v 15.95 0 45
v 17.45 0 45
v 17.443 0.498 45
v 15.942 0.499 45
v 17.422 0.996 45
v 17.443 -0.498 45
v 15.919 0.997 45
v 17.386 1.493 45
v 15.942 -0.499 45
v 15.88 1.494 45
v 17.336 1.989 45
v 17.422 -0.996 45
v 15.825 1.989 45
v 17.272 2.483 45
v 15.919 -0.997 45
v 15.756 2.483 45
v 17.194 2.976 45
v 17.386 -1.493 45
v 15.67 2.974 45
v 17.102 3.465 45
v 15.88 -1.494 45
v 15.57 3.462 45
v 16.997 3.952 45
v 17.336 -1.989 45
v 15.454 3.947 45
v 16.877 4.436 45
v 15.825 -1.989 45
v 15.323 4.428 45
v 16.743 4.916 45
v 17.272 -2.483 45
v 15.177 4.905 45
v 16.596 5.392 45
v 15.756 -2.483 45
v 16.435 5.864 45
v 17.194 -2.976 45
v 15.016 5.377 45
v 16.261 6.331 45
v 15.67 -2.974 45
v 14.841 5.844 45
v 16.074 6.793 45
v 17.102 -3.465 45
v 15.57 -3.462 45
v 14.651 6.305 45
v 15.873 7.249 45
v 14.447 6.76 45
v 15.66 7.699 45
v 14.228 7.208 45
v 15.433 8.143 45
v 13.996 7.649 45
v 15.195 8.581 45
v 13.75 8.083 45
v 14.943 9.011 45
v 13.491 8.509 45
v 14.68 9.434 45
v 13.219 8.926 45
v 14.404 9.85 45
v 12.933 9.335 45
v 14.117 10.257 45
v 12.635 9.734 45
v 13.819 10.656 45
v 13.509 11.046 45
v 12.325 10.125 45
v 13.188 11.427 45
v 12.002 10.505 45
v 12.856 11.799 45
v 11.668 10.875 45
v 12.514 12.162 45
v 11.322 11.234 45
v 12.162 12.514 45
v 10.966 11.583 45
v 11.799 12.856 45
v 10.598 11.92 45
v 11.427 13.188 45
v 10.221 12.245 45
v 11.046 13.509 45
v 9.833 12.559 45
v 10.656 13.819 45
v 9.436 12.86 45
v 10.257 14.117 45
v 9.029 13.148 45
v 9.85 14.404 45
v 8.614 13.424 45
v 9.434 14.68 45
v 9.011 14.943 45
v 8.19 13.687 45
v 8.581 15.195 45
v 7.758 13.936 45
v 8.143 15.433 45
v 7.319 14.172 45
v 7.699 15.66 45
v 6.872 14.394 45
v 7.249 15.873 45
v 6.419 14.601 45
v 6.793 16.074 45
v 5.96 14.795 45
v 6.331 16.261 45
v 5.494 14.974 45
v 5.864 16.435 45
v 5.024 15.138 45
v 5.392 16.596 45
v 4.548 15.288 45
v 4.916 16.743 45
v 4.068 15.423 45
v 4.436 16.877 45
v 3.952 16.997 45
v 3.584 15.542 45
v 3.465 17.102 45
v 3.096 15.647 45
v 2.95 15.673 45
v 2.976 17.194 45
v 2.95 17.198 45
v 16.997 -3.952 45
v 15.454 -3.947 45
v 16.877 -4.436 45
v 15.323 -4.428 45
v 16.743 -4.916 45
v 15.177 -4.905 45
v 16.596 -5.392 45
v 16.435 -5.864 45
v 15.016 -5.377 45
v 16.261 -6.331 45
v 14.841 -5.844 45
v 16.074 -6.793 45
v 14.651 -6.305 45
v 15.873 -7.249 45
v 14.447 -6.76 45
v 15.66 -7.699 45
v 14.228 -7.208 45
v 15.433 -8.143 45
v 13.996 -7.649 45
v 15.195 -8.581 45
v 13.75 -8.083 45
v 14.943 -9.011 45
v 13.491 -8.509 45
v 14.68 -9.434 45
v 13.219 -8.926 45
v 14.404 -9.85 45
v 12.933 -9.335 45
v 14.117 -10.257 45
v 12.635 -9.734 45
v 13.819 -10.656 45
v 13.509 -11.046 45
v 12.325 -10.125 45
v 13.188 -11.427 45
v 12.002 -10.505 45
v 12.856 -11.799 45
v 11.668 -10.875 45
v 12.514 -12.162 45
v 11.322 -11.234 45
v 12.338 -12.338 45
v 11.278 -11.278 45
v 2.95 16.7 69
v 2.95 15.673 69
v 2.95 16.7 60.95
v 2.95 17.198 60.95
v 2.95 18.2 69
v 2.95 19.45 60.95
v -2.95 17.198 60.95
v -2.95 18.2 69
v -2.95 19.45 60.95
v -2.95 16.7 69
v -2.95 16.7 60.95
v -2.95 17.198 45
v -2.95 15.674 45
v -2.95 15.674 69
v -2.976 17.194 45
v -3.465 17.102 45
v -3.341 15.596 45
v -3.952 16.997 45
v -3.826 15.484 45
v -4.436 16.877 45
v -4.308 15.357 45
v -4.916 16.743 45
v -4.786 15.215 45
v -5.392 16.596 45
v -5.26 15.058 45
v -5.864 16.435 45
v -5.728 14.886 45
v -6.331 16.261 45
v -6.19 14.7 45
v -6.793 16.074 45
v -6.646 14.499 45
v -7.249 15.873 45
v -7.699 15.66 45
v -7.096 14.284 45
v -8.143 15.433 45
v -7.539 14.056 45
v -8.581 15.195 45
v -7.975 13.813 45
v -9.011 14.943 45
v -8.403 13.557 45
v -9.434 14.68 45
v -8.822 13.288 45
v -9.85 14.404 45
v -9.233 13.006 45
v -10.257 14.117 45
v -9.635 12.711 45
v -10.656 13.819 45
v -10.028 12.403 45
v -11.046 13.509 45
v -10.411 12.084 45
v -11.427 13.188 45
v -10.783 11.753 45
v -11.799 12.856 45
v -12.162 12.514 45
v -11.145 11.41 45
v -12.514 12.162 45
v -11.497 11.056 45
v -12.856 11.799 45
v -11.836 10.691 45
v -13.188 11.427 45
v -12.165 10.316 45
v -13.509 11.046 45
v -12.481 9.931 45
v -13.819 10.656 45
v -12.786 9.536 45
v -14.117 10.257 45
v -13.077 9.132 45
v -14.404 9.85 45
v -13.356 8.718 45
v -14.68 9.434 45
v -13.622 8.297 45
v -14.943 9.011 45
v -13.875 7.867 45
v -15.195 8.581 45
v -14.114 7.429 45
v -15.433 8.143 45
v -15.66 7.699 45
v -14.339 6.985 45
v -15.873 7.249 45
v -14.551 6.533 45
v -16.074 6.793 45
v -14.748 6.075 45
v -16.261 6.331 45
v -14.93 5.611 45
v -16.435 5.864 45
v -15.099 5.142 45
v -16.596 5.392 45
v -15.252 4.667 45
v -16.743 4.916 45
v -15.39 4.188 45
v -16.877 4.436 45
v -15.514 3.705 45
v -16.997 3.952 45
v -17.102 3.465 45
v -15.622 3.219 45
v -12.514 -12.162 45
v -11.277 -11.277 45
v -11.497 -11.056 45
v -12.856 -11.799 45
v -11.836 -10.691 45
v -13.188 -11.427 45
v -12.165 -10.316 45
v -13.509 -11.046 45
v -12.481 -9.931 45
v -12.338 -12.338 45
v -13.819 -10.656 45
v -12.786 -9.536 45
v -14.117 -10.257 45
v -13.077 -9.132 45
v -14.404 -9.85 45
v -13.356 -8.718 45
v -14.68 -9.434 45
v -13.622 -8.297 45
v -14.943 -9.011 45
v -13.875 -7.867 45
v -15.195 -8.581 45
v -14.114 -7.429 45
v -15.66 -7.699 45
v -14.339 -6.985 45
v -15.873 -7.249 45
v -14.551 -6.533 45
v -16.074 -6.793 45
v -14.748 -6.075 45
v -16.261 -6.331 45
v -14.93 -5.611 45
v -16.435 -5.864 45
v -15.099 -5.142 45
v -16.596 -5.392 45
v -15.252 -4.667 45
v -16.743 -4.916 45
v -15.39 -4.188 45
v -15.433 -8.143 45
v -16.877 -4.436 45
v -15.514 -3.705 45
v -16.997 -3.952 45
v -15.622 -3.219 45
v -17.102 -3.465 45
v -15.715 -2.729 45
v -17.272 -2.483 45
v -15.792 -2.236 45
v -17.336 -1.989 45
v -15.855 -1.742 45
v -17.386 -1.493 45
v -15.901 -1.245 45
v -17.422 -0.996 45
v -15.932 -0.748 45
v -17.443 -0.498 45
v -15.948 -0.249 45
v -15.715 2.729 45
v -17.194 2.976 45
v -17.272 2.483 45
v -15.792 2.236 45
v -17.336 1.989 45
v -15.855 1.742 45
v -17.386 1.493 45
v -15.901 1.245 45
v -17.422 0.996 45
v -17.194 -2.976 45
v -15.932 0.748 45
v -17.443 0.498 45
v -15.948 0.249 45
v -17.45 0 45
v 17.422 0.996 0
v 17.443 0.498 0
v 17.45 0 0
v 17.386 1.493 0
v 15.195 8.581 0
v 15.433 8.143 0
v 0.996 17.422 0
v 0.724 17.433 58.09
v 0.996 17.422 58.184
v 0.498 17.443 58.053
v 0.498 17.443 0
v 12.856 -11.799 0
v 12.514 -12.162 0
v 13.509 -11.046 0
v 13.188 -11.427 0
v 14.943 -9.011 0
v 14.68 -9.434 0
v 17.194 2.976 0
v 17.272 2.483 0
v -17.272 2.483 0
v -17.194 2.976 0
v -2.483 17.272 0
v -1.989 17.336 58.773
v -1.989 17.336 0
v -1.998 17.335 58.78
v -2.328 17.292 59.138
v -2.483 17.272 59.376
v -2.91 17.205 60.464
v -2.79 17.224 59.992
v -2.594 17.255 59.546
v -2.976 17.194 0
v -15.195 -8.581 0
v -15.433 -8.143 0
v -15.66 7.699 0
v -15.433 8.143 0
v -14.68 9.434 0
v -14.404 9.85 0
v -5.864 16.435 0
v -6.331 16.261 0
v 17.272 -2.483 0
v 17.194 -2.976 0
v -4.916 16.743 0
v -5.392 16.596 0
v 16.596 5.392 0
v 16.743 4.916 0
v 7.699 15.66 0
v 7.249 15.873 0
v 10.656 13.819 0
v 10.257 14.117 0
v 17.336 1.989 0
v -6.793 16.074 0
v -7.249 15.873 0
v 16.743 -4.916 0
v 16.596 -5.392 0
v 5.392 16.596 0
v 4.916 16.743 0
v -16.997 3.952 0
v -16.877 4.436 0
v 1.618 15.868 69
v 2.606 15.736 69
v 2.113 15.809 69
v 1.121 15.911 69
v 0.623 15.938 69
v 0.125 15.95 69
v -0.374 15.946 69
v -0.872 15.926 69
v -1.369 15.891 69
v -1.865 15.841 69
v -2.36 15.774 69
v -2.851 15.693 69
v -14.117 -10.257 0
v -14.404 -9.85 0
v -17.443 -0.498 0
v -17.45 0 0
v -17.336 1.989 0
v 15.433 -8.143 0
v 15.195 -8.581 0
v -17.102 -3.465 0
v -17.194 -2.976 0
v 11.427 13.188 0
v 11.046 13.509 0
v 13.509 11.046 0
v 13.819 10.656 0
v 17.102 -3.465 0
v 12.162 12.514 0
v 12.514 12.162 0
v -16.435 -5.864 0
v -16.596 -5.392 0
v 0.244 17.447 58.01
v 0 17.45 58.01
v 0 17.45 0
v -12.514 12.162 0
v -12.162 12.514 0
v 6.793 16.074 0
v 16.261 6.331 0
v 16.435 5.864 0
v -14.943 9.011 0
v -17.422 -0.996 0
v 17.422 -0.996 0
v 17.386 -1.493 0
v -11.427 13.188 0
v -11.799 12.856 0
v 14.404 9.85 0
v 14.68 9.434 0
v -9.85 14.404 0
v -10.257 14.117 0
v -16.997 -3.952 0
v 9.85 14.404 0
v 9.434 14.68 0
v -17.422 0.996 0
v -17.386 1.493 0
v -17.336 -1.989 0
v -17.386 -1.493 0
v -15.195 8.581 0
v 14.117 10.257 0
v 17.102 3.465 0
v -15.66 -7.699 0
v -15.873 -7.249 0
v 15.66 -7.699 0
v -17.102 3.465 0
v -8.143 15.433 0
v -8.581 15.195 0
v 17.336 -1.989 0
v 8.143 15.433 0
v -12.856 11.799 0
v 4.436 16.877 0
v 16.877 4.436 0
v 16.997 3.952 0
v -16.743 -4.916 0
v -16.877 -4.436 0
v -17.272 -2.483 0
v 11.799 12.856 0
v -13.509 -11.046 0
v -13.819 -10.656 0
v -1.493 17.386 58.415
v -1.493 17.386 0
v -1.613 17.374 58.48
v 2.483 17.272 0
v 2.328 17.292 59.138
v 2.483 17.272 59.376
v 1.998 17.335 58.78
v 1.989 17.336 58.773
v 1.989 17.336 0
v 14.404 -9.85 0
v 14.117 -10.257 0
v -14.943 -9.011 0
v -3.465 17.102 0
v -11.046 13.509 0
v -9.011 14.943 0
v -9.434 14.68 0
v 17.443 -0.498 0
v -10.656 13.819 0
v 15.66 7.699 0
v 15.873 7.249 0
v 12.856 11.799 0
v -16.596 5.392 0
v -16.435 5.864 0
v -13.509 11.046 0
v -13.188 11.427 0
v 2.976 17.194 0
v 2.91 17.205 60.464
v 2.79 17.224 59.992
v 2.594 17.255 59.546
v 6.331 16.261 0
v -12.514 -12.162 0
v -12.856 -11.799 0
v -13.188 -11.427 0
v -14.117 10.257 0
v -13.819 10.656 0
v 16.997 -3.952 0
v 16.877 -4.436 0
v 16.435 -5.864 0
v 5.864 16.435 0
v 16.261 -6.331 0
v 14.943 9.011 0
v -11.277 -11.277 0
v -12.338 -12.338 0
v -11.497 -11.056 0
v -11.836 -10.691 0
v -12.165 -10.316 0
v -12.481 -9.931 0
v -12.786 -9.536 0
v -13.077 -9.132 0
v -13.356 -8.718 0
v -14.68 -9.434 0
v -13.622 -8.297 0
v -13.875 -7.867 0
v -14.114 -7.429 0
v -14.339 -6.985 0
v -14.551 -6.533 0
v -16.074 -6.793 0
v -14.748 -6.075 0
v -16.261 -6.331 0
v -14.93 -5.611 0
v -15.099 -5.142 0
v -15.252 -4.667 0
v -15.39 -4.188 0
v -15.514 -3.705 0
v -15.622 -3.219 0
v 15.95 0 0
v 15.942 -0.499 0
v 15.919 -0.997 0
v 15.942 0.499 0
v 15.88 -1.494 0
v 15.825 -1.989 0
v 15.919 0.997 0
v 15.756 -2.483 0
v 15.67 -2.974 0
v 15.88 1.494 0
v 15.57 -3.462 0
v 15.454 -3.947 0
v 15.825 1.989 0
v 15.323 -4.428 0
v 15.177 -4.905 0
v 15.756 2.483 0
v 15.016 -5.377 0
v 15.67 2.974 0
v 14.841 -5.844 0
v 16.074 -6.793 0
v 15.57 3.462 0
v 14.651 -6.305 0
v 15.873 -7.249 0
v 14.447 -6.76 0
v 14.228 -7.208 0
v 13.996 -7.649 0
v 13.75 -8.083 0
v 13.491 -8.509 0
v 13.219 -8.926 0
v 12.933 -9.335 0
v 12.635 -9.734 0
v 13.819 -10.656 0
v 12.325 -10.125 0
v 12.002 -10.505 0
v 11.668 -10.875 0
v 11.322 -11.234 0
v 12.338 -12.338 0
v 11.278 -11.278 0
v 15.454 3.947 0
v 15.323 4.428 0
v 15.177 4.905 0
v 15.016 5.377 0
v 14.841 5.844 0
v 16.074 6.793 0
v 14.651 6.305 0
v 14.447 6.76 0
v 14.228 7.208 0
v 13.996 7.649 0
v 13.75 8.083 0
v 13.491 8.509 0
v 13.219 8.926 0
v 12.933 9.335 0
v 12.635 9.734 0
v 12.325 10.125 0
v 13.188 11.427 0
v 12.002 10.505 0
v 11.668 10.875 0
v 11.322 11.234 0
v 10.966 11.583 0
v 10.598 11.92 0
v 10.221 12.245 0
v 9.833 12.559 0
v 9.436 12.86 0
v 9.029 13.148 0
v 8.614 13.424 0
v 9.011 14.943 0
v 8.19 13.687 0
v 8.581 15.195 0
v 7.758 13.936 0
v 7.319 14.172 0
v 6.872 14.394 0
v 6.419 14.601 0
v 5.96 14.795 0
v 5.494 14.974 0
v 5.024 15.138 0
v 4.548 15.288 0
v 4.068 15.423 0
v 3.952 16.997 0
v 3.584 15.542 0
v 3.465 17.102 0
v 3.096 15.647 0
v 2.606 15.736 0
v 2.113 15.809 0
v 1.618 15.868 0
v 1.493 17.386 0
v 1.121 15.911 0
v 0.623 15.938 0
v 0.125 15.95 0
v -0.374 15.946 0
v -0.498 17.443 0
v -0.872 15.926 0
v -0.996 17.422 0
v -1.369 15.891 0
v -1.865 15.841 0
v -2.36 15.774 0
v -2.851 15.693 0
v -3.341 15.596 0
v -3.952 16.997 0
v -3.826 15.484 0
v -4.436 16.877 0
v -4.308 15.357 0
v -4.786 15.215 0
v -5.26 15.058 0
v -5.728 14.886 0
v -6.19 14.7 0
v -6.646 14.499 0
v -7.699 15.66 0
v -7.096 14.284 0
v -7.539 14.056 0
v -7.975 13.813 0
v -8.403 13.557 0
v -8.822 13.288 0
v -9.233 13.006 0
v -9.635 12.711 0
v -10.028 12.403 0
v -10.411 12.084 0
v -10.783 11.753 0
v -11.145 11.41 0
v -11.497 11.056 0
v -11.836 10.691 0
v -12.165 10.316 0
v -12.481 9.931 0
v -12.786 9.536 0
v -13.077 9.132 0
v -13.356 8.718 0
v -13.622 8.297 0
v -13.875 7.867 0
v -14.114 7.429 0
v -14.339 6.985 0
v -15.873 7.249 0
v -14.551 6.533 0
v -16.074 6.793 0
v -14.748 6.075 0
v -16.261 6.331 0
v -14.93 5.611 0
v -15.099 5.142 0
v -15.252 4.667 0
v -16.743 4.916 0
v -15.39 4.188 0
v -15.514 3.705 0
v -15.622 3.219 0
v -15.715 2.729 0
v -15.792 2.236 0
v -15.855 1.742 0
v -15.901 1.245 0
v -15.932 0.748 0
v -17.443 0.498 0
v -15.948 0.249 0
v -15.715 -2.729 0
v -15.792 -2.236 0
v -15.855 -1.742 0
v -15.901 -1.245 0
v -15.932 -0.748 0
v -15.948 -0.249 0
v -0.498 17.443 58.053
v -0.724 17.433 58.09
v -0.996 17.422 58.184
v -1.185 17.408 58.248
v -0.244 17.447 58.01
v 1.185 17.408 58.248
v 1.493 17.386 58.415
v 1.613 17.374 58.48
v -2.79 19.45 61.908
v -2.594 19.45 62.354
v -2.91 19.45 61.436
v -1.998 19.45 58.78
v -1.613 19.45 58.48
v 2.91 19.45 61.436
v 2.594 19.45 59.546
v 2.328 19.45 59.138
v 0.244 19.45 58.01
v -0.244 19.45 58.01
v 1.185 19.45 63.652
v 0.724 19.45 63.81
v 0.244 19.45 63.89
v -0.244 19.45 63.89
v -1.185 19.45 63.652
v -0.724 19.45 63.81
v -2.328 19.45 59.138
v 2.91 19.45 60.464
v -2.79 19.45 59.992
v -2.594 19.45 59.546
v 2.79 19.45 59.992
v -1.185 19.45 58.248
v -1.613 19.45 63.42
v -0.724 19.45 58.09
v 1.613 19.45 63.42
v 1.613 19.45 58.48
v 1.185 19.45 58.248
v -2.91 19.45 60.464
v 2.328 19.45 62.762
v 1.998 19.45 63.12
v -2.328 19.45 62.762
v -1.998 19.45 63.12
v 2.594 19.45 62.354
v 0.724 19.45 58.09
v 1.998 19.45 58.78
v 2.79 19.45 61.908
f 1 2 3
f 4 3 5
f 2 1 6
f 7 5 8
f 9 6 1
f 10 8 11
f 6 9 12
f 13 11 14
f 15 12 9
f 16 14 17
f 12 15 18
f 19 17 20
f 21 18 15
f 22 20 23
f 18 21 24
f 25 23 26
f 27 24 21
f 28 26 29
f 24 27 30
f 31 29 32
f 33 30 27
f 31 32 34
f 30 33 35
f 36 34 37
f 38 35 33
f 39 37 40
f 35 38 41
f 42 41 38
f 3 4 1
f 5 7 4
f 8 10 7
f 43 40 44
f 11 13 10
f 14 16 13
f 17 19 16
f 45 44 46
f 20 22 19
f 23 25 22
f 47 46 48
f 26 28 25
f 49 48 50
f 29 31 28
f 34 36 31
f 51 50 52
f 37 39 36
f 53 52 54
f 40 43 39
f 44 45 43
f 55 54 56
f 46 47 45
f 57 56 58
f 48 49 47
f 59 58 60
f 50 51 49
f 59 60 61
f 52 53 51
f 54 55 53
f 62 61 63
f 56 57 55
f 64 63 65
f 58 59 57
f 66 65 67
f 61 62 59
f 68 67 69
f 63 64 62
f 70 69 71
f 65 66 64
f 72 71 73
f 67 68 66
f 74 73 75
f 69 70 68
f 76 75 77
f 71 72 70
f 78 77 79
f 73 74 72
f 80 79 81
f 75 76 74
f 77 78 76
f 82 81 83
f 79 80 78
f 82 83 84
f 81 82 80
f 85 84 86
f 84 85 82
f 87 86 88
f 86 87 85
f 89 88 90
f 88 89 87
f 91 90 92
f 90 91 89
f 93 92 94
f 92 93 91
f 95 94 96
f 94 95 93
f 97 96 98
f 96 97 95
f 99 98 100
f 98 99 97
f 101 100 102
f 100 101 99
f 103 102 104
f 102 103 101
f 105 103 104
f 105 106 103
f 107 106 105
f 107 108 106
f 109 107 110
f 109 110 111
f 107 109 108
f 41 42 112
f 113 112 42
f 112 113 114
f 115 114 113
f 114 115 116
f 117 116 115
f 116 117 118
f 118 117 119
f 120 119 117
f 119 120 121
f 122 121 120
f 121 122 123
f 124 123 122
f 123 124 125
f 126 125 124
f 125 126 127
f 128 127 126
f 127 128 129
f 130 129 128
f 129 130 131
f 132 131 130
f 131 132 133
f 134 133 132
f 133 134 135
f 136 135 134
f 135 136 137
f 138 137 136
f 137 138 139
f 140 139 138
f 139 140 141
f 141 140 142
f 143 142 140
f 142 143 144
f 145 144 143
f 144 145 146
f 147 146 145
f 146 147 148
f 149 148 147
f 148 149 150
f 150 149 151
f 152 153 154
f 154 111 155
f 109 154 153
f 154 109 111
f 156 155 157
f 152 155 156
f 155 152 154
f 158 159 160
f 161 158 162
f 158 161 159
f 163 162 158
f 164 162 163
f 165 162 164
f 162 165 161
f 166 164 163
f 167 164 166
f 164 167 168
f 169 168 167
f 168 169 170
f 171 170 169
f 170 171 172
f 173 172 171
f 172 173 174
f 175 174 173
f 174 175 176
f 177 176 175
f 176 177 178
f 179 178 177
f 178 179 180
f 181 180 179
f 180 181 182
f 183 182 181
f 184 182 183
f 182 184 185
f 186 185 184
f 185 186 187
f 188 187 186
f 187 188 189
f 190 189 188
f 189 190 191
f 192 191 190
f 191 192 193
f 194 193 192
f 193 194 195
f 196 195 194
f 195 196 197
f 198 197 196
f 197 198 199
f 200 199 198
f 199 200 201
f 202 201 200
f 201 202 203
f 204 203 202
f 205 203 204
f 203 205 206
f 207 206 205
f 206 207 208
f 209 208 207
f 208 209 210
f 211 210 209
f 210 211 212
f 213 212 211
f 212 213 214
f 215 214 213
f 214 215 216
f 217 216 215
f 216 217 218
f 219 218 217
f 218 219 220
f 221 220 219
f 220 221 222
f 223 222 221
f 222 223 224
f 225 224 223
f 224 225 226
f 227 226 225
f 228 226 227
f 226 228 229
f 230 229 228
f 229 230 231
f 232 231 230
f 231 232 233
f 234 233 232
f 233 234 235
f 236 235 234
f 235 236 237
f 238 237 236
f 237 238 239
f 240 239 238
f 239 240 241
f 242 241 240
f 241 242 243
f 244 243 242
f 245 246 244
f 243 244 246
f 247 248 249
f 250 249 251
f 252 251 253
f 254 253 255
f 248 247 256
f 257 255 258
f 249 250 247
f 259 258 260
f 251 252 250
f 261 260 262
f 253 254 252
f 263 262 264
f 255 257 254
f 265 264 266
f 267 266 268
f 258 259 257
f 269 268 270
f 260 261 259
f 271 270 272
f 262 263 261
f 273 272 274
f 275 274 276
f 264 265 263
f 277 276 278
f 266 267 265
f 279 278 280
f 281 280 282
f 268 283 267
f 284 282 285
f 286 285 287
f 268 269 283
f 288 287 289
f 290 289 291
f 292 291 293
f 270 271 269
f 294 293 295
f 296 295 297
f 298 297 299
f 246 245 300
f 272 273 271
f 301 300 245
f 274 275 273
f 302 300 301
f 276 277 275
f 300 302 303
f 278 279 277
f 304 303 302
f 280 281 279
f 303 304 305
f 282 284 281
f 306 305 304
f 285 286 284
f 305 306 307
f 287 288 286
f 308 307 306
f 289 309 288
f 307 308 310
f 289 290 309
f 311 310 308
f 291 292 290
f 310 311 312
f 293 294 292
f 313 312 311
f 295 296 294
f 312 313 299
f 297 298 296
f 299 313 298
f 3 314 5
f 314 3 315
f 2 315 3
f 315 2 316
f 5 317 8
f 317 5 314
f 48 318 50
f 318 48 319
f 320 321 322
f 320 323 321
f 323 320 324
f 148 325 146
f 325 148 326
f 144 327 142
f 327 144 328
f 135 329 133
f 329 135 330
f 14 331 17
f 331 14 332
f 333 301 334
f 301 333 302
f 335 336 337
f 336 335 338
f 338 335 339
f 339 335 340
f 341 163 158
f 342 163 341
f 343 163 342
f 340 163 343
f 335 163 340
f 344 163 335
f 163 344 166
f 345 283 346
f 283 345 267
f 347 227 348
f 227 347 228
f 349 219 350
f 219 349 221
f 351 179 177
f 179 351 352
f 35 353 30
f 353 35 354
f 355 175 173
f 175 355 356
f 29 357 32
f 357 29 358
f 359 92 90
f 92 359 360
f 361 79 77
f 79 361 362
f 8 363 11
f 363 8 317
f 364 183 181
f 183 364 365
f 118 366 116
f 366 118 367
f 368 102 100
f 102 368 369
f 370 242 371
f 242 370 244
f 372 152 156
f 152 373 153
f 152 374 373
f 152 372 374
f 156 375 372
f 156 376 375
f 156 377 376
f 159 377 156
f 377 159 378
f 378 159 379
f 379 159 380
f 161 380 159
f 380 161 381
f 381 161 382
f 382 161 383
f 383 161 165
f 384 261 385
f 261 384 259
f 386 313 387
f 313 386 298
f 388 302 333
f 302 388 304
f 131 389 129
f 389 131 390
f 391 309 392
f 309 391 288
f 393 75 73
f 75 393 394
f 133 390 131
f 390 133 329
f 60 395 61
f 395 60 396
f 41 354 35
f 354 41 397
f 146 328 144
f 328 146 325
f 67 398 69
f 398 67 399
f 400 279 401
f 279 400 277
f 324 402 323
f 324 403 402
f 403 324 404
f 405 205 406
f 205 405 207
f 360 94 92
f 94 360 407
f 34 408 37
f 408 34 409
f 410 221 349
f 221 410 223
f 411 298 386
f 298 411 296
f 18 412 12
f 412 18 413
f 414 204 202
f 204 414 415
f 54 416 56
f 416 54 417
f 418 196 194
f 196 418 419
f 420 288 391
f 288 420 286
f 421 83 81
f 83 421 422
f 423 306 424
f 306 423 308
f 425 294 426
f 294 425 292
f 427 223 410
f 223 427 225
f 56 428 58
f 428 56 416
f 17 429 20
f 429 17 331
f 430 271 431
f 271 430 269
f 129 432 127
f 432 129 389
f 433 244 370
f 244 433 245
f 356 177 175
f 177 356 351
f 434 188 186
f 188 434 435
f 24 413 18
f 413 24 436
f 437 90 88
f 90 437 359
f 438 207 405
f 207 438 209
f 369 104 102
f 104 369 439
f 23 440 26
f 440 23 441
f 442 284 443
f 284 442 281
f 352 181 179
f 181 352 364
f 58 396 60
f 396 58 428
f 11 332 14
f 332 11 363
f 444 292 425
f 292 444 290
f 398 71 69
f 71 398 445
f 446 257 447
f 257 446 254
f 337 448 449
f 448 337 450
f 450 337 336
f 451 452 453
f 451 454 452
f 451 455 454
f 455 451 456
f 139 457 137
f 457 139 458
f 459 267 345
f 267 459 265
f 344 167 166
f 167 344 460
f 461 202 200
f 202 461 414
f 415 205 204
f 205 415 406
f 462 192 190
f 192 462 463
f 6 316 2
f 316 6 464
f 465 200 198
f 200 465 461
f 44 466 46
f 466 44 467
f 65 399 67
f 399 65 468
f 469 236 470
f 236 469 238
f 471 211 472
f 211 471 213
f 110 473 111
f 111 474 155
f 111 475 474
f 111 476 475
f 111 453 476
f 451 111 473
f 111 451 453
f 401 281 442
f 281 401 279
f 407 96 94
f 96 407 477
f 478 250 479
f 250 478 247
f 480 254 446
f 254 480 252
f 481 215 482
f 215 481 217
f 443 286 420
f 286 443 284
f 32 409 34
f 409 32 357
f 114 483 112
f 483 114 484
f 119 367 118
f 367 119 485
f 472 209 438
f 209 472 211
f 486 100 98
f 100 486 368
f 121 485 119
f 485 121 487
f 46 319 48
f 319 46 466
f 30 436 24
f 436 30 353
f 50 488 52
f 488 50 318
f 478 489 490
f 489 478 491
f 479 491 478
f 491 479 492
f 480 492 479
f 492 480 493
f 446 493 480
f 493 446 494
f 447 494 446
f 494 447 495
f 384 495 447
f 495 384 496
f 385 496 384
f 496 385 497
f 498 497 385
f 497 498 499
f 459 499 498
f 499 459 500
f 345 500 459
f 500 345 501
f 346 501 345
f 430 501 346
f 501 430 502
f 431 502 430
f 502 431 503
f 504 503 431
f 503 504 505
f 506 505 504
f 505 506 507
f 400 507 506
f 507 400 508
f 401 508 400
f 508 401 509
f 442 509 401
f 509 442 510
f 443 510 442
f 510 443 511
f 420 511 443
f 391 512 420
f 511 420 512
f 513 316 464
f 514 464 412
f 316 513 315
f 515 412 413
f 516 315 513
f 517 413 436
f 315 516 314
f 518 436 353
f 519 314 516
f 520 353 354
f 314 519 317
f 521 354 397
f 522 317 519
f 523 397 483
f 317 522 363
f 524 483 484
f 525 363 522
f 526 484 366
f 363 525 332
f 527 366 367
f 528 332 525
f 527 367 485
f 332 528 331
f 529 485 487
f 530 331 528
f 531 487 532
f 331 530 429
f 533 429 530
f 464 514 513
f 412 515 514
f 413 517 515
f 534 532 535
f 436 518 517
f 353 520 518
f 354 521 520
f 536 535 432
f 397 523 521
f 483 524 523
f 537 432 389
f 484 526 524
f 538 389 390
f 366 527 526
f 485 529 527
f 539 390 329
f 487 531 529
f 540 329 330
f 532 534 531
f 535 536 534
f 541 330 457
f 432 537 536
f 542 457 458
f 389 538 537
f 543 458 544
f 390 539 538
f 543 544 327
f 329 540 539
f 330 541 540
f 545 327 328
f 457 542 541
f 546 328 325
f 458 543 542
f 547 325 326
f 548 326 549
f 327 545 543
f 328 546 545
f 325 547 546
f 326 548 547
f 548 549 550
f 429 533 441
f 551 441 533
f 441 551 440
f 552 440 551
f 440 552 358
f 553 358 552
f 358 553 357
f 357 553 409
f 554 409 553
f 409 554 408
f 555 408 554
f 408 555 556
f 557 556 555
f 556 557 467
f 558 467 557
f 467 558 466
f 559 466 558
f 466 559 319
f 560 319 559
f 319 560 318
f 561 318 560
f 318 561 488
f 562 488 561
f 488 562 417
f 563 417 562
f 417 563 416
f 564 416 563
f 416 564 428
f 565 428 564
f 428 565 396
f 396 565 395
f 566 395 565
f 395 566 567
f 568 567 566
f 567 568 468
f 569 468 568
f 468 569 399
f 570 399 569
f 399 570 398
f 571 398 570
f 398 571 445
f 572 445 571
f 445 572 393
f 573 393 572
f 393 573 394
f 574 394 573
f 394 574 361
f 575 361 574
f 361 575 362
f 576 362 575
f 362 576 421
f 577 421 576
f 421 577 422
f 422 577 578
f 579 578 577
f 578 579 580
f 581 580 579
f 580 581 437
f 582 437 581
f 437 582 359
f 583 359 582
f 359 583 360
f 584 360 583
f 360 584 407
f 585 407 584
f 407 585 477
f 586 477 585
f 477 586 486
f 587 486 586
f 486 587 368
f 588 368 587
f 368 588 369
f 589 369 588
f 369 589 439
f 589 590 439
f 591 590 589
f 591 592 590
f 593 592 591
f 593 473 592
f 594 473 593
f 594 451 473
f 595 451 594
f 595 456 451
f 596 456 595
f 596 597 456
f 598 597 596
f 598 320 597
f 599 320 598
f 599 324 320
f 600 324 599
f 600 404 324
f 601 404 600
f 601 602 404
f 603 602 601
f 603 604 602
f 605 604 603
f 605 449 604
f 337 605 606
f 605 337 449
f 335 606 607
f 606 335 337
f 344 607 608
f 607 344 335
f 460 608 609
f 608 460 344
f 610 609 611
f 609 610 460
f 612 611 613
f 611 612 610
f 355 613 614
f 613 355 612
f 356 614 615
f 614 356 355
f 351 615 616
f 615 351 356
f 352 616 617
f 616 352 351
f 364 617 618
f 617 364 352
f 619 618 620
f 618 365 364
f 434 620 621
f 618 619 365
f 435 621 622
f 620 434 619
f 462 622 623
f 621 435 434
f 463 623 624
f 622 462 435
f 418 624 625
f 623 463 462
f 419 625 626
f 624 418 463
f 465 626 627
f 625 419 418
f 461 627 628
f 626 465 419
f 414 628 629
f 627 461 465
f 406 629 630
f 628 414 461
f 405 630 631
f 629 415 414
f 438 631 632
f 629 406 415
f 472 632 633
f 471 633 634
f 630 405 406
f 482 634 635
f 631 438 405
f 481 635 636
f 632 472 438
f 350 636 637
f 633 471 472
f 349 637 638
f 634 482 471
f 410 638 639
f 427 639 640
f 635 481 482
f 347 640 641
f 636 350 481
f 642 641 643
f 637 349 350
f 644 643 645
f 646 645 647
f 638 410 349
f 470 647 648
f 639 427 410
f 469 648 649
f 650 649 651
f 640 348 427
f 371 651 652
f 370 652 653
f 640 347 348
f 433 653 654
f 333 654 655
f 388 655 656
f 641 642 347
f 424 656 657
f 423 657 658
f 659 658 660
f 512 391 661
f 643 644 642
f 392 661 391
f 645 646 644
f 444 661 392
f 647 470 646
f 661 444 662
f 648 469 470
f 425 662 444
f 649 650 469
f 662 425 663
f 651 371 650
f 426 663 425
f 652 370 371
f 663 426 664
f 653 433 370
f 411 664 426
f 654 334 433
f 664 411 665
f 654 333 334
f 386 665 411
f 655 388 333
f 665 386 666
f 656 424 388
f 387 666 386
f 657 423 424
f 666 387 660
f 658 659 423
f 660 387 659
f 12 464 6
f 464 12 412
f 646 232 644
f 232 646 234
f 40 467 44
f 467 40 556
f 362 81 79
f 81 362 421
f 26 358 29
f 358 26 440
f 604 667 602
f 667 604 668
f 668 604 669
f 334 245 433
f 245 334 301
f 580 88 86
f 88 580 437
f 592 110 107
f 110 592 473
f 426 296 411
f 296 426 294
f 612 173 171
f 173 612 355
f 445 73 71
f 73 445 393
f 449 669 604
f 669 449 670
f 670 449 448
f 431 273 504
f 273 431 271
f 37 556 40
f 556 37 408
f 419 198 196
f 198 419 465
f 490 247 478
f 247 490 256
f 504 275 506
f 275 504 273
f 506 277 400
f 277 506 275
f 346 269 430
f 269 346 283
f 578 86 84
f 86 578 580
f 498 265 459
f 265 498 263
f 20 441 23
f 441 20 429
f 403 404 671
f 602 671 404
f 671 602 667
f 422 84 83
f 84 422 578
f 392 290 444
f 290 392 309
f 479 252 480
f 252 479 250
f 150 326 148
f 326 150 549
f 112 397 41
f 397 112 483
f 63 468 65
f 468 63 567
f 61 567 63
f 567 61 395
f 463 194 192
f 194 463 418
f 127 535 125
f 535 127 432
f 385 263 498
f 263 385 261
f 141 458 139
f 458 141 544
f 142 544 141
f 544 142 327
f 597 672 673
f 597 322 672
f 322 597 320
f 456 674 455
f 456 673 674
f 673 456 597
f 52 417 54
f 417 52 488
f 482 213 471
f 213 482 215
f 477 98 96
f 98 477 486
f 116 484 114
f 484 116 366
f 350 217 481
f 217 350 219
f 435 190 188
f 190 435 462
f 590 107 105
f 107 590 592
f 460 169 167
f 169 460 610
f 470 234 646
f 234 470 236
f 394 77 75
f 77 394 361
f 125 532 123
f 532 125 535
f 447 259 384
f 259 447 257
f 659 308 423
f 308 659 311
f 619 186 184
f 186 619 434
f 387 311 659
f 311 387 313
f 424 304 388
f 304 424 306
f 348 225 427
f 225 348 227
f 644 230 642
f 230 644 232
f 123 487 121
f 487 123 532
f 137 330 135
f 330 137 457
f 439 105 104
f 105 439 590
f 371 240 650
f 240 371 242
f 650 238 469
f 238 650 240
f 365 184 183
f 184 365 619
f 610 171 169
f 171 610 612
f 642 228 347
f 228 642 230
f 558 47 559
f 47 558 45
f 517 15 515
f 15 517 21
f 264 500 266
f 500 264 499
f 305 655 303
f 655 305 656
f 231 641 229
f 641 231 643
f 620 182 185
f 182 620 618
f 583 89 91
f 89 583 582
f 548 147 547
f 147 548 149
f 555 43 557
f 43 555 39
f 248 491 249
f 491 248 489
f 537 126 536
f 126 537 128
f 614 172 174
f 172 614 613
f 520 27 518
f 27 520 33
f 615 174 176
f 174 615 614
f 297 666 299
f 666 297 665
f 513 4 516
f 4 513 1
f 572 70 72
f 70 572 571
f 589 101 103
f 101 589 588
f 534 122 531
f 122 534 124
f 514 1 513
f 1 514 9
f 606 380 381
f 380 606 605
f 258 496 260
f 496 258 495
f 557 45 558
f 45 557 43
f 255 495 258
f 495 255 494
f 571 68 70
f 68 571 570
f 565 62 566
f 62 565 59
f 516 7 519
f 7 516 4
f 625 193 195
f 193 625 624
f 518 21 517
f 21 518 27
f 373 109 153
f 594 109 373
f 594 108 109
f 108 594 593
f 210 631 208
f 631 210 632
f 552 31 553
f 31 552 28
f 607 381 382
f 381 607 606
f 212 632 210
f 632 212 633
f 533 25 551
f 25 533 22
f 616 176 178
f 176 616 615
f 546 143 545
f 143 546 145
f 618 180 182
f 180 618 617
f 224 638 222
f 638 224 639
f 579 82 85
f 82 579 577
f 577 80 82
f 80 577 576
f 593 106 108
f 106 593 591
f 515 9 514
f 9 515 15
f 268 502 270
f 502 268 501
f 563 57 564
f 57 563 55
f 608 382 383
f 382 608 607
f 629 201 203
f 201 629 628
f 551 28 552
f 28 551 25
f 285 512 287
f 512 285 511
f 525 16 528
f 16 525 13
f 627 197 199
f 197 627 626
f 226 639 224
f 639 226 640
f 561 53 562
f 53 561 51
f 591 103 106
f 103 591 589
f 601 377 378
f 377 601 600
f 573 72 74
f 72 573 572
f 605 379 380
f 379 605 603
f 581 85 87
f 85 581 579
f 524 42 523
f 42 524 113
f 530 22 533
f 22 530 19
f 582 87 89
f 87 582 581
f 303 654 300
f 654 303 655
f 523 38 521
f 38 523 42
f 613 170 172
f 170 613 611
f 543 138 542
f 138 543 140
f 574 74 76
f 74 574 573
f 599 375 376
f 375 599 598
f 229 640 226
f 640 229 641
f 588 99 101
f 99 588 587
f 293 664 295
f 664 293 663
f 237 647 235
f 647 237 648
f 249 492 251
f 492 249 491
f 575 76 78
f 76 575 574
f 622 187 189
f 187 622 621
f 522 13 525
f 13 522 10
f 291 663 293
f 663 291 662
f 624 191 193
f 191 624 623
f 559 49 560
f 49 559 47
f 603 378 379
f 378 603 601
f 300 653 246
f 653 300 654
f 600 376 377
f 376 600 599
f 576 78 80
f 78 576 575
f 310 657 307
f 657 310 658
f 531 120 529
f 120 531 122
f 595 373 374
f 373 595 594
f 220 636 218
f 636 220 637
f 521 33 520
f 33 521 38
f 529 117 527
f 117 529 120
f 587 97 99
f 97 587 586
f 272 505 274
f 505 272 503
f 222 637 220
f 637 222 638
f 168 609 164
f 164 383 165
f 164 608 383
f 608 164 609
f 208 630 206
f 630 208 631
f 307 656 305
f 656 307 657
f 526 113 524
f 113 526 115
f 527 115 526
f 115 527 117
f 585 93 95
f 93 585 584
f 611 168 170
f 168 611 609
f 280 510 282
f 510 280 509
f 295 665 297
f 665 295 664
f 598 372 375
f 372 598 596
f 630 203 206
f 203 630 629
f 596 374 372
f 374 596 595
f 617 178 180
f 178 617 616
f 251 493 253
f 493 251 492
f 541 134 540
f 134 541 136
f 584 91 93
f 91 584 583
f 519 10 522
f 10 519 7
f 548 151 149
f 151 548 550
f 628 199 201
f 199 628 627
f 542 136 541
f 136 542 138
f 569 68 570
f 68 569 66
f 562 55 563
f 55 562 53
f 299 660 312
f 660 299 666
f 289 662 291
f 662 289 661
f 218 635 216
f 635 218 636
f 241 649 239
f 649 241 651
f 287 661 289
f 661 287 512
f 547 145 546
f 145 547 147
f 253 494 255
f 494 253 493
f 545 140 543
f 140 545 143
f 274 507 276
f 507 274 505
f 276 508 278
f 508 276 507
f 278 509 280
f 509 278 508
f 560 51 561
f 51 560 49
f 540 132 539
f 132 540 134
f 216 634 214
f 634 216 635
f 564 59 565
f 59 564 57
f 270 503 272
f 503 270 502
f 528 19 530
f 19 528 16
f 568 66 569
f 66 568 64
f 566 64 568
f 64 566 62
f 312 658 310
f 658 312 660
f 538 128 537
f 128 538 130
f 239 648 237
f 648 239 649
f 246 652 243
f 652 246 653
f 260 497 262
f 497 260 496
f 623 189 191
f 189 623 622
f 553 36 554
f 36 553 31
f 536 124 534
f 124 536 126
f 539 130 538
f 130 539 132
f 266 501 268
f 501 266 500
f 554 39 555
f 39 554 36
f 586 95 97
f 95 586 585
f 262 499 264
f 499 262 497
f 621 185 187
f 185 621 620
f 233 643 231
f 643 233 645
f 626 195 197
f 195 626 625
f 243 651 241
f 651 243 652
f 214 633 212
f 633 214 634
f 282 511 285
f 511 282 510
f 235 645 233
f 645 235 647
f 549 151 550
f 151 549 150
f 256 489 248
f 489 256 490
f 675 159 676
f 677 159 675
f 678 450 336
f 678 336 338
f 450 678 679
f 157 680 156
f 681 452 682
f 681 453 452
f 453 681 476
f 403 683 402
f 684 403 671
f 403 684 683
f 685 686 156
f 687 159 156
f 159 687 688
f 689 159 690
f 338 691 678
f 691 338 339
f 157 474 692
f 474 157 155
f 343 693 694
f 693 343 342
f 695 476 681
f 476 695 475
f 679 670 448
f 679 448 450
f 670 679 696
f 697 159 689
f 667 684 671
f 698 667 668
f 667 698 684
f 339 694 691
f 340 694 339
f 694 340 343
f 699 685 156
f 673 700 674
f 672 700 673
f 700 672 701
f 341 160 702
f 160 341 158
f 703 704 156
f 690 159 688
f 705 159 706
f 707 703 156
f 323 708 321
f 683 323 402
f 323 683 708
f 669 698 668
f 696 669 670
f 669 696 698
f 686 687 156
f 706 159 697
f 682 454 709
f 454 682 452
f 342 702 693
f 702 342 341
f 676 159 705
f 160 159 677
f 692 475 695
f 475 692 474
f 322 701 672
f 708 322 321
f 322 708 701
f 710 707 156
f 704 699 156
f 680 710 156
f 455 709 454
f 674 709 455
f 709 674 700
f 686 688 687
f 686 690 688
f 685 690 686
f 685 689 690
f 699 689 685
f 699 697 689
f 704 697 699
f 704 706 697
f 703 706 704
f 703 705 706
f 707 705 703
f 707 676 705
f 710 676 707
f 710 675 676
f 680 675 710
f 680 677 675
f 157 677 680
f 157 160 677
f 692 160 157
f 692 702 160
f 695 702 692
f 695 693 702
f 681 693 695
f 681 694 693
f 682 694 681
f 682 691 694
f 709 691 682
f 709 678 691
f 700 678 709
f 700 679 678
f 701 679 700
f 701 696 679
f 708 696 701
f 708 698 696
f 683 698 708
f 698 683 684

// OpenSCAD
// Brompton seatpost height insert

height = 45; // Desired reduction in seatpost height from maximum extent
slack = 0.1; // Increase this to let the seatpost slide more freely

inner_diameter = 31.8 + slack;
outer_diameter = 35.0 - slack;
wall = (outer_diameter - inner_diameter) / 2;
tab_width = 6 - slack;
tab_height = 24;
clip_height = 11;
clip_depth = 2;
tab_depth = (outer_diameter - inner_diameter) / 2;

$fa = 0.5;
$fs = 0.5;
$e = 0.001;

difference() {
  // Main cylinder
  cylinder(r=outer_diameter / 2, h=height + tab_height);
  translate([0, 0, -$e])
    cylinder(r=inner_diameter / 2, h=height + tab_height + 2*$e);

  // Cut out a quarter to facilitate movement
  rotate([0, 0, 225], v = [0, 0, 0]) {
    translate([0, 0, -$e])
      cube([outer_diameter, outer_diameter, height + tab_height + 2*$e]);
  }

  // Cut away shoulders to leave tab
  for (a = [0, 180]) {
    rotate([0, 0, a], v = [0, 0, 0]) {
      translate([tab_width / 2, -(outer_diameter / 2 + $e), height])
        cube([outer_diameter + 2*$e, outer_diameter + 2*$e, tab_height + $e]);
    }
  }
}

// Clip on top of tab
hull() {
  translate([-tab_width / 2, outer_diameter / 2 - wall / 2, height + tab_height - $e])
    cube([tab_width, wall, $e]);

  translate([0, outer_diameter / 2 - wall / 2, height + tab_height - clip_height + tab_width / 2])
    rotate([-90, 0, 0])
      cylinder(r = tab_width / 2, h = clip_depth + wall / 2);
}
